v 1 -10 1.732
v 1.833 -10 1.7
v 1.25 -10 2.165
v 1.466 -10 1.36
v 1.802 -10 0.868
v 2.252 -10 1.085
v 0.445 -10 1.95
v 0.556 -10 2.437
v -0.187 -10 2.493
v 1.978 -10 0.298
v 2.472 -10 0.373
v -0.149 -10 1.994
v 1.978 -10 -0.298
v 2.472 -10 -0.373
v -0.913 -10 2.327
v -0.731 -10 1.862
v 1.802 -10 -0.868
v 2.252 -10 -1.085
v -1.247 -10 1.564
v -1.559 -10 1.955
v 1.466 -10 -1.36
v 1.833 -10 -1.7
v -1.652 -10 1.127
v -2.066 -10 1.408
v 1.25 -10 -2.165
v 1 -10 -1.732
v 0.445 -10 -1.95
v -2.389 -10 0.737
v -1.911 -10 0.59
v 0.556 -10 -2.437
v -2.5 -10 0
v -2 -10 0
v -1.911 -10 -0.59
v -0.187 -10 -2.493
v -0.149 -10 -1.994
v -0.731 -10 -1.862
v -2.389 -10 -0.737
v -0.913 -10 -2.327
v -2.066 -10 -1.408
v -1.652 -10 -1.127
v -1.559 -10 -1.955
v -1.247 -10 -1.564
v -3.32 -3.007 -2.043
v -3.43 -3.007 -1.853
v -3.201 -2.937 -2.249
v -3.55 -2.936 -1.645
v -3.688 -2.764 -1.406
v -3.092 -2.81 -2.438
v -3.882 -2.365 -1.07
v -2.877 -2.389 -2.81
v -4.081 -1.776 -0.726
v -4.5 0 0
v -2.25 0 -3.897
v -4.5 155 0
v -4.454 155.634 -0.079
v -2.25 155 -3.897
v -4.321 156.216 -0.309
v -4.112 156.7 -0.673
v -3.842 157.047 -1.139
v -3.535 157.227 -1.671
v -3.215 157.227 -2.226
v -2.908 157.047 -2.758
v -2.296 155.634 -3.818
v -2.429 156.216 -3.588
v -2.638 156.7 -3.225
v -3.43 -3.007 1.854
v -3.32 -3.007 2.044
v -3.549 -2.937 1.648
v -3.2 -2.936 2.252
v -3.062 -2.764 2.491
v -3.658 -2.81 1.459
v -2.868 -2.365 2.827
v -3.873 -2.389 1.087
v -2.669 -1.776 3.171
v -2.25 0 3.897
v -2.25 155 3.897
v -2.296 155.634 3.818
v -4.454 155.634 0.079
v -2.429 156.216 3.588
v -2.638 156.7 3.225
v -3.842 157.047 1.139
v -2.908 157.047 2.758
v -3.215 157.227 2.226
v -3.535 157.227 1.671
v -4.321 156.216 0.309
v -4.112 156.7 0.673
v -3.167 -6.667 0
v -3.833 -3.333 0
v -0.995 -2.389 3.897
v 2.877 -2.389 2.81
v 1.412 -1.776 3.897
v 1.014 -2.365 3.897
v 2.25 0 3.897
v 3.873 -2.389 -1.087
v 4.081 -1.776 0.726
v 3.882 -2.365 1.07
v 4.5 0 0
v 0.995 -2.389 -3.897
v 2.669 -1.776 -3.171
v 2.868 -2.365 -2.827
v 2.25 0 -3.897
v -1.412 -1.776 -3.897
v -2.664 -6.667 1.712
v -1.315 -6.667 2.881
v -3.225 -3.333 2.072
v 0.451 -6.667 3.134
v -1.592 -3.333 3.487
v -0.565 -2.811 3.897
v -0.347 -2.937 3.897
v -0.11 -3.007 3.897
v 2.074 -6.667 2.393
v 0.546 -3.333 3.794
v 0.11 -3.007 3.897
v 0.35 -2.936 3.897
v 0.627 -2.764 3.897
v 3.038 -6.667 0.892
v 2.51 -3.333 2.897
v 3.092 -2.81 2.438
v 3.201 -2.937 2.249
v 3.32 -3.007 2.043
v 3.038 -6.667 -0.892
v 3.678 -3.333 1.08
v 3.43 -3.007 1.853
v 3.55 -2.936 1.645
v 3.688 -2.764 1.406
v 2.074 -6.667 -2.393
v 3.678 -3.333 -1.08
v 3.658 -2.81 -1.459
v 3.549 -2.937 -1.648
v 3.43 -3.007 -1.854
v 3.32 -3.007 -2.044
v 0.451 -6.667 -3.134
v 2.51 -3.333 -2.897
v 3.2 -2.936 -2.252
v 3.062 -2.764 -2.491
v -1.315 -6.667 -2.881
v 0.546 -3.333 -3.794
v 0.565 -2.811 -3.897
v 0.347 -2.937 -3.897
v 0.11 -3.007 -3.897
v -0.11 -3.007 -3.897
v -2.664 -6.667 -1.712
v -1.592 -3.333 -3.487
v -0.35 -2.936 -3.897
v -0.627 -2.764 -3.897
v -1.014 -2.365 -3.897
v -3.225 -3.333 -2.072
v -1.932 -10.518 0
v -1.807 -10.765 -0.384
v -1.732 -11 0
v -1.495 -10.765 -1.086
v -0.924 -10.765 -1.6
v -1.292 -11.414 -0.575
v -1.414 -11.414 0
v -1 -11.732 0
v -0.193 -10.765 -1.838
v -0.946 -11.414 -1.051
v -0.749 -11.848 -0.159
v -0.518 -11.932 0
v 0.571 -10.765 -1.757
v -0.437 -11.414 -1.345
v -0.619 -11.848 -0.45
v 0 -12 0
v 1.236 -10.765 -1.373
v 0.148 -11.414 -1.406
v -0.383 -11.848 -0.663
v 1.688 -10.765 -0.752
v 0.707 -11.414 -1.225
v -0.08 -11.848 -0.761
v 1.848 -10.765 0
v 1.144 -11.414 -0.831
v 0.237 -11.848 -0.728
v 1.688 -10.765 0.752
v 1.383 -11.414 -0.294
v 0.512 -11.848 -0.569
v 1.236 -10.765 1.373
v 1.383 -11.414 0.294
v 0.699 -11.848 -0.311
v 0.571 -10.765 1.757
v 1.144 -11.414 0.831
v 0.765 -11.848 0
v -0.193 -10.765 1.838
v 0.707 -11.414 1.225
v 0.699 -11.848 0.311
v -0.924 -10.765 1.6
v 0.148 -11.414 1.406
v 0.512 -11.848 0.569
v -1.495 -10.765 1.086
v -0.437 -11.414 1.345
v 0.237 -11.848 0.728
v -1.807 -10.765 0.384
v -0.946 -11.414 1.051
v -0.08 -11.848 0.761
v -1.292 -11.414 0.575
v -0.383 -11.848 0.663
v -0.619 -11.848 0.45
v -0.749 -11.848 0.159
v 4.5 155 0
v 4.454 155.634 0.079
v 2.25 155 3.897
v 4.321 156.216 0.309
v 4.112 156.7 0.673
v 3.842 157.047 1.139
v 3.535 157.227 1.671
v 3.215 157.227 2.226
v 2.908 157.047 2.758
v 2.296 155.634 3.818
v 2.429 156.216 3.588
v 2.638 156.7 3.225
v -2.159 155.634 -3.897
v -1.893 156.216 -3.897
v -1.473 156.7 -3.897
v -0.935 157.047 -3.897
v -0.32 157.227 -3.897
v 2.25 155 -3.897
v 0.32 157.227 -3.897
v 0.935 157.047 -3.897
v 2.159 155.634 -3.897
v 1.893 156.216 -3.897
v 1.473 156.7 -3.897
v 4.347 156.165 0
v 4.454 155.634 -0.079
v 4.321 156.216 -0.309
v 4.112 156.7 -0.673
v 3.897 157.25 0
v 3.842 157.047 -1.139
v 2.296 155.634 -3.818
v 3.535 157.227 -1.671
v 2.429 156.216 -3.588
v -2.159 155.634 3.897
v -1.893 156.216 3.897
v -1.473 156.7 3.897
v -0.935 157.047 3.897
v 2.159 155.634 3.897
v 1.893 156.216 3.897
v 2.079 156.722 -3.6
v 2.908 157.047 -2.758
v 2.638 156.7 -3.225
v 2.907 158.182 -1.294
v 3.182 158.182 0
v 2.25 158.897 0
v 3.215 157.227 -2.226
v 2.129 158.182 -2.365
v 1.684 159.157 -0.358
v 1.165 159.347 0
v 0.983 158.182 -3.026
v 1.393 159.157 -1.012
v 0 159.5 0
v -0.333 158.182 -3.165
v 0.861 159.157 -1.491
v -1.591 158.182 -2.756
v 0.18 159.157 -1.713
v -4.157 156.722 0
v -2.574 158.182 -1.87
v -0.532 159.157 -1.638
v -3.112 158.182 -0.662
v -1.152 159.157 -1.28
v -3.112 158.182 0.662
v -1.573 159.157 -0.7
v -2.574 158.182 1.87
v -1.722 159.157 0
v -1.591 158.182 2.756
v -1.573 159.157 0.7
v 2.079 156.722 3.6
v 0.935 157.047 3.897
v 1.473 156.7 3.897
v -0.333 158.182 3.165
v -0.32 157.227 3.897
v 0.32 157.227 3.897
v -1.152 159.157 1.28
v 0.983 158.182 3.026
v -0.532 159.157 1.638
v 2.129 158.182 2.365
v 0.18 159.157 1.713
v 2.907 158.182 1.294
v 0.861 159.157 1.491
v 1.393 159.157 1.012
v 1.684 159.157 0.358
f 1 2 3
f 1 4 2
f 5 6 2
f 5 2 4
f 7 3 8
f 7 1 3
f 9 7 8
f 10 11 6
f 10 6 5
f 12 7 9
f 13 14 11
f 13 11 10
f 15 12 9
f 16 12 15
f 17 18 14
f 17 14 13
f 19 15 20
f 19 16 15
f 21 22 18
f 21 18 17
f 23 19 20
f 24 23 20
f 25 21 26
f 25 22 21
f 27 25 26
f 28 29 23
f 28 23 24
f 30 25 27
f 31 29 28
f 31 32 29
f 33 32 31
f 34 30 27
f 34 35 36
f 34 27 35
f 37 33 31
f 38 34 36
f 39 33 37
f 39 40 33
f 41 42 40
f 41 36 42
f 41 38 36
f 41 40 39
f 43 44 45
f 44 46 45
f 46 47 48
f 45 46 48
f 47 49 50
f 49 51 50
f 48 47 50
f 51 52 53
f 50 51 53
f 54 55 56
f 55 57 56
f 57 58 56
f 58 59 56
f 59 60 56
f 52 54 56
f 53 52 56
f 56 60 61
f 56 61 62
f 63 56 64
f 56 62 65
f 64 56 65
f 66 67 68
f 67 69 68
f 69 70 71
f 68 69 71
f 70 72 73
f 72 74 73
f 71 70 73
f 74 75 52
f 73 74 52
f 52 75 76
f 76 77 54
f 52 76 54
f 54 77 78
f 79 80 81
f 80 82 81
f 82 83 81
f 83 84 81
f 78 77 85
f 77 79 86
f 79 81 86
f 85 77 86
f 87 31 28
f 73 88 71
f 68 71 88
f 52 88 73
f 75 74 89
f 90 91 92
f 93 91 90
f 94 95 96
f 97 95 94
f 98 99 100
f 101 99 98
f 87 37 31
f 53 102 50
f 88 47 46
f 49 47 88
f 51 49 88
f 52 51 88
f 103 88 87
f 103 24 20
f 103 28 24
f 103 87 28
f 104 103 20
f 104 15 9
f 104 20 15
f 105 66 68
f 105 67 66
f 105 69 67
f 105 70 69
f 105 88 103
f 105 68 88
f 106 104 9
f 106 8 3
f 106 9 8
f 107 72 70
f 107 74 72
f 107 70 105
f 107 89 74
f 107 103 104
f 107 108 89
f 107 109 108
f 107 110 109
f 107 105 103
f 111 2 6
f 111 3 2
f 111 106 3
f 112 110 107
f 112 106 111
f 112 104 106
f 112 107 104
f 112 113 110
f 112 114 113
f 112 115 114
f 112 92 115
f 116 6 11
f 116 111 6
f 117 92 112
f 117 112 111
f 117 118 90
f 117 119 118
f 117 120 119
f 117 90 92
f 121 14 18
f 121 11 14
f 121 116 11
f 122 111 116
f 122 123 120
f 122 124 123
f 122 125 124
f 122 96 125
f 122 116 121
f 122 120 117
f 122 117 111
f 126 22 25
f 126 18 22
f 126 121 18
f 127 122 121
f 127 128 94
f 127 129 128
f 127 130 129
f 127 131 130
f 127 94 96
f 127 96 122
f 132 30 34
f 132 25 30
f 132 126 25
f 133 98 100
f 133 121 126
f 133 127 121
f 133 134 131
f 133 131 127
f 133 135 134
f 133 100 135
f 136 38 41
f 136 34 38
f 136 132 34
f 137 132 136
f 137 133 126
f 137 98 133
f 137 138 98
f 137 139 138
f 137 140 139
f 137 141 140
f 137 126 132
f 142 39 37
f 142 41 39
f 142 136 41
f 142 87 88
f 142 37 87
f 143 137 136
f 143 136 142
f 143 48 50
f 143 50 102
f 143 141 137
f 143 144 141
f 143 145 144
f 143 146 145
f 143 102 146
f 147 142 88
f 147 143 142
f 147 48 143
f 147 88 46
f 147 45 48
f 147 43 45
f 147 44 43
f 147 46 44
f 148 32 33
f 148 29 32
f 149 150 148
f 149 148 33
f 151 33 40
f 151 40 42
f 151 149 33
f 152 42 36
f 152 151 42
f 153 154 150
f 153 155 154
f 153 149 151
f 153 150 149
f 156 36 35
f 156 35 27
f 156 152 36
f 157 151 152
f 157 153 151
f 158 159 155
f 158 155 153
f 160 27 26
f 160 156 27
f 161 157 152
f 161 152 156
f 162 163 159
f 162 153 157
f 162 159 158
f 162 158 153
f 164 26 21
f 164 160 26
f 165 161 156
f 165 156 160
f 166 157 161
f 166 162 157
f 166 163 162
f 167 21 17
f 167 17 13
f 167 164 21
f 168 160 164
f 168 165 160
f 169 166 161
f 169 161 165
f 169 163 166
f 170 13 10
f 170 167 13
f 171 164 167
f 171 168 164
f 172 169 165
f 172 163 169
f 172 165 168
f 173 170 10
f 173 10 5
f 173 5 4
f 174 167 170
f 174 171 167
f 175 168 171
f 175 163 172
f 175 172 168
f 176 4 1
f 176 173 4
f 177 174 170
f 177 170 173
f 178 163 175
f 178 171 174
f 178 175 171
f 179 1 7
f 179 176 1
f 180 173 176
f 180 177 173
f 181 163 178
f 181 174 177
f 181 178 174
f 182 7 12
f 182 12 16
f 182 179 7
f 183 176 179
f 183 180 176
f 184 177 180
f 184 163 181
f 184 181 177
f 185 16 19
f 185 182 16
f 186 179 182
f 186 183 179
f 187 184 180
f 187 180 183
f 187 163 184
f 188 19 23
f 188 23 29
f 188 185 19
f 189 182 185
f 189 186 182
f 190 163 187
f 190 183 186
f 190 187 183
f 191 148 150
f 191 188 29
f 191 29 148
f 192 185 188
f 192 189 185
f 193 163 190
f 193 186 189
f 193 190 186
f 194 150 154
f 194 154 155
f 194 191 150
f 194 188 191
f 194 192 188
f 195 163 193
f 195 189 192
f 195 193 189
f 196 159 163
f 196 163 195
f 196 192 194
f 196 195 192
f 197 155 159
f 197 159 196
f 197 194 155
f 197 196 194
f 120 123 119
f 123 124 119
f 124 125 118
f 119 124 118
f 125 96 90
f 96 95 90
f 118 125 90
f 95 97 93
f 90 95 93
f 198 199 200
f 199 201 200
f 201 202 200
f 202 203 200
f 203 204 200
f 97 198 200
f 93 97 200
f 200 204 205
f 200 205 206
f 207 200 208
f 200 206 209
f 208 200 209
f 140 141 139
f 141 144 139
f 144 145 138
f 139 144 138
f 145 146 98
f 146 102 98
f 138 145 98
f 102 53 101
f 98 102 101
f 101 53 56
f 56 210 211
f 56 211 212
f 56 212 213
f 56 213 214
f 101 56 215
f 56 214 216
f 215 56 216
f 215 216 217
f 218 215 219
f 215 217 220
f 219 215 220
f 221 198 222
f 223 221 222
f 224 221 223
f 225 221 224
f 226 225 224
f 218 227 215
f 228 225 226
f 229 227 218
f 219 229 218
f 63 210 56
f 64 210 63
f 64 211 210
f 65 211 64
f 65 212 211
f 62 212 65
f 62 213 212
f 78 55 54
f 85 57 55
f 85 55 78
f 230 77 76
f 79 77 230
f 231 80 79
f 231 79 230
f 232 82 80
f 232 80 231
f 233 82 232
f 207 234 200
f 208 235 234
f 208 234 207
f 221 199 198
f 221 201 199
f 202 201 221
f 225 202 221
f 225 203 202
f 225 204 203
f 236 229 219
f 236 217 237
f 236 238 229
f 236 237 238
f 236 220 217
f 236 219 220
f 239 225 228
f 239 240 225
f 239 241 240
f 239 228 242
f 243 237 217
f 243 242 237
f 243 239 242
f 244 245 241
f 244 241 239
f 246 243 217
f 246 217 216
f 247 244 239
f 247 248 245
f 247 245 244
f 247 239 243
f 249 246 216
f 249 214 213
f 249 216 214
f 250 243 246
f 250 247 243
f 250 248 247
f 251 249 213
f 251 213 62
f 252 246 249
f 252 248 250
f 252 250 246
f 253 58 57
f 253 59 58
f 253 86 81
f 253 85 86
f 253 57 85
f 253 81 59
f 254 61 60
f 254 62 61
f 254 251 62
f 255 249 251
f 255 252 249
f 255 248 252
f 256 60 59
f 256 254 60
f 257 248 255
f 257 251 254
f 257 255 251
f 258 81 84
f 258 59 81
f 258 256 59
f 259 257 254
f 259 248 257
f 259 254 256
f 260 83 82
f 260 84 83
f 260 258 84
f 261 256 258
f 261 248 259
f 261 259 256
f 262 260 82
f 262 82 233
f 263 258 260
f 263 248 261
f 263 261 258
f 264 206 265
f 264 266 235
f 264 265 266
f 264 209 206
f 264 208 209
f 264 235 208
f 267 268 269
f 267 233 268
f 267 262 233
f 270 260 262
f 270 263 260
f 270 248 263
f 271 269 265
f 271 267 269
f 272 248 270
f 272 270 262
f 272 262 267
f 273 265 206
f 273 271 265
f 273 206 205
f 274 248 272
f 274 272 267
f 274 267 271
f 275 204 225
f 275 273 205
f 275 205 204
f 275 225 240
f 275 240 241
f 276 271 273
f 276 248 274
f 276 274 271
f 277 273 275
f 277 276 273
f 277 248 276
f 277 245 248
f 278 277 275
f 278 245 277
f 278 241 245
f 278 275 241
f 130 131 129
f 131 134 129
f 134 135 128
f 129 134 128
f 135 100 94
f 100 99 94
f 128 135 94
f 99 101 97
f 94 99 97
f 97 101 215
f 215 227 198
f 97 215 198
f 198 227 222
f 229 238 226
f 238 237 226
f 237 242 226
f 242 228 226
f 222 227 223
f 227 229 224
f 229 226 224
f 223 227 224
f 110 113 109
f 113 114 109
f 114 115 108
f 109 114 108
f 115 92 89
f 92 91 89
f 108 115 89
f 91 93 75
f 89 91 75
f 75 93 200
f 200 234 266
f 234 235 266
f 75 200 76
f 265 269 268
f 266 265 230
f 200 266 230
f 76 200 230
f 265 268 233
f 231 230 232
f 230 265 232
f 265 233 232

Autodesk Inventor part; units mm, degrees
ref_plane "YZ Plane" through (0, 0, 0) normal (1, 0, 0) x (0, 1, 0)
ref_plane "XZ Plane" through (0, 0, 0) normal (0, 1, 0) x (-1, 0, 0)
ref_plane "XY Plane" through (0, 0, 0) normal (0, 0, 1) x (1, 0, 0)
sketch "Sketch1" plane through (0, 0, 0) normal (0, 1, 0) x (-1, 0, 0)
  line L0 (-4.5, 0) -> (-2.25, 3.8971)
  line L1 (-2.25, 3.8971) -> (2.25, 3.8971)
  line L2 (2.25, 3.8971) -> (4.5, 0)
  line L3 (4.5, 0) -> (2.25, -3.8971)
  line L4 (2.25, -3.8971) -> (-2.25, -3.8971)
  line L5 (-2.25, -3.8971) -> (-4.5, 0)
  point P0 (0, 0)
  point P1 (0, 0)
  dimension "d1" = 9
extrude "Extrusion1" add sketch "Sketch1" along normal blind 155
sketch "Sketch2" plane through (0, 0, 0) normal (0, 0, 1) x (1, 0, 0)
  line L0 (2.25, 155) -> (-2.25, 155) projected
  line L1 (2.25, 155) -> (4.5, 155) projected
  arc A0 (4.5, 155) -> (0, 159.5) centre (0, 155) ccw
  line L2 (0, 155) -> (0, 159.5)
  line L3 (0, 155) -> (4.5, 155)
  point P0 (0, 0)
revolve "Revolution1" add sketch "Sketch2" angle 360 about axis through (0, 155, 0) along (0, 1, 0)
sketch "Sketch3" plane through (0, 0, 0) normal (0, -1, 0) x (1, 0, 0)
  line L0 (2.25, -3.8971) -> (-2.25, -3.8971) projected
  arc A0 (-4.5, 0) -> (-2.25, -3.8971) centre (0, 0) ccw projected
  line L1 (2.25, -3.8971) -> (-2.25, -3.8971)
  line L2 (-2.25, -3.8971) -> (-4.5, 0) projected
  line L3 (-2.25, -3.8971) -> (-4.5, 0)
  arc A1 (-2.25, 3.8971) -> (-4.5, 0) centre (0, 0) ccw projected
  line L4 (-4.5, 0) -> (-2.25, 3.8971)
  arc A2 (2.25, 3.8971) -> (-2.25, 3.8971) centre (0, 0) ccw projected
  line L5 (-2.25, 3.8971) -> (2.25, 3.8971)
  line L6 (2.25, 3.8971) -> (4.5, 0)
  line L7 (4.5, 0) -> (2.25, -3.8971)
  point P0 (0, 0)
extrude "Extrusion2" cut sketch "Sketch3" along normal mid plane 400 contours L0 L2 L4 L5 L6 L7 keep common part
sketch "Sketch4" plane through (0, 0, 0) normal (0, 0, 1) x (1, 0, 0)
  line L0 (-4.5, 0) -> (-4.5, 155) projected
  line L1 (0, 0) -> (-4.5, 0)
  line L2 (0, 0) -> (0, -10)
  line L3 (0, -10) -> (-2.5, -10)
  line L4 (-4.5, 0) -> (-2.5, -10)
  point P0 (-4.5, 100)
  dimension "d7" = 10
  dimension "d9" = 2.5
revolve "Revolution2" add sketch "Sketch4" angle 360 about axis through (0, 0, 0) along (0, -1, 0)
thicken "Thicken1" operation cut thickness 5 both sides no extend neighbours no toward (0, -1, 0) faces at (-0.4635, 0, 4.0247)
thicken "Thicken2" operation cut thickness 5 both sides no extend neighbours no toward (0, -1, 0) faces at (-3.2537, 0, 2.4138)
thicken "Thicken3" operation cut thickness 5 both sides no extend neighbours no toward (0, -1, 0) faces at (-3.7172, 0, -1.6109)
thicken "Thicken4" operation cut thickness 5 both sides no extend neighbours no toward (0, -1, 0) faces at (3.4635, 0, 2.1807)
thicken "Thicken5" operation cut thickness 5 both sides no extend neighbours no toward (0, -1, 0) faces at (3.7172, 0, -1.6109)
thicken "Thicken6" operation cut thickness 5 both sides no extend neighbours no toward (0, -1, 0) faces at (0.1568, 0, -4.0899)
sketch "Sketch5" plane through (0, 0, 0) normal (0, 0, 1) x (1, 0, 0)
  line L0 (-2.5, -10) -> (2.5, -10) projected
  arc A0 (2, -10) -> (0, -12) centre (0, -10) ccw
  line L1 (0, -10) -> (0, -12)
  line L2 (2.5, -10) -> (2, -10)
  line L3 (-2, -10) -> (-2.5, -10)
  line L4 (0, -10) -> (-2, -10)
  point P0 (0, 0)
  point P1 (-2, -10)
  dimension "d23" = 4
revolve "Revolution3" add sketch "Sketch5" angle 360 about axis through (0, -10, 0) along (0, -1, 0) contours L0 L1 A0
properties part number "stylus_pen" material "Acetal Resin, White"
